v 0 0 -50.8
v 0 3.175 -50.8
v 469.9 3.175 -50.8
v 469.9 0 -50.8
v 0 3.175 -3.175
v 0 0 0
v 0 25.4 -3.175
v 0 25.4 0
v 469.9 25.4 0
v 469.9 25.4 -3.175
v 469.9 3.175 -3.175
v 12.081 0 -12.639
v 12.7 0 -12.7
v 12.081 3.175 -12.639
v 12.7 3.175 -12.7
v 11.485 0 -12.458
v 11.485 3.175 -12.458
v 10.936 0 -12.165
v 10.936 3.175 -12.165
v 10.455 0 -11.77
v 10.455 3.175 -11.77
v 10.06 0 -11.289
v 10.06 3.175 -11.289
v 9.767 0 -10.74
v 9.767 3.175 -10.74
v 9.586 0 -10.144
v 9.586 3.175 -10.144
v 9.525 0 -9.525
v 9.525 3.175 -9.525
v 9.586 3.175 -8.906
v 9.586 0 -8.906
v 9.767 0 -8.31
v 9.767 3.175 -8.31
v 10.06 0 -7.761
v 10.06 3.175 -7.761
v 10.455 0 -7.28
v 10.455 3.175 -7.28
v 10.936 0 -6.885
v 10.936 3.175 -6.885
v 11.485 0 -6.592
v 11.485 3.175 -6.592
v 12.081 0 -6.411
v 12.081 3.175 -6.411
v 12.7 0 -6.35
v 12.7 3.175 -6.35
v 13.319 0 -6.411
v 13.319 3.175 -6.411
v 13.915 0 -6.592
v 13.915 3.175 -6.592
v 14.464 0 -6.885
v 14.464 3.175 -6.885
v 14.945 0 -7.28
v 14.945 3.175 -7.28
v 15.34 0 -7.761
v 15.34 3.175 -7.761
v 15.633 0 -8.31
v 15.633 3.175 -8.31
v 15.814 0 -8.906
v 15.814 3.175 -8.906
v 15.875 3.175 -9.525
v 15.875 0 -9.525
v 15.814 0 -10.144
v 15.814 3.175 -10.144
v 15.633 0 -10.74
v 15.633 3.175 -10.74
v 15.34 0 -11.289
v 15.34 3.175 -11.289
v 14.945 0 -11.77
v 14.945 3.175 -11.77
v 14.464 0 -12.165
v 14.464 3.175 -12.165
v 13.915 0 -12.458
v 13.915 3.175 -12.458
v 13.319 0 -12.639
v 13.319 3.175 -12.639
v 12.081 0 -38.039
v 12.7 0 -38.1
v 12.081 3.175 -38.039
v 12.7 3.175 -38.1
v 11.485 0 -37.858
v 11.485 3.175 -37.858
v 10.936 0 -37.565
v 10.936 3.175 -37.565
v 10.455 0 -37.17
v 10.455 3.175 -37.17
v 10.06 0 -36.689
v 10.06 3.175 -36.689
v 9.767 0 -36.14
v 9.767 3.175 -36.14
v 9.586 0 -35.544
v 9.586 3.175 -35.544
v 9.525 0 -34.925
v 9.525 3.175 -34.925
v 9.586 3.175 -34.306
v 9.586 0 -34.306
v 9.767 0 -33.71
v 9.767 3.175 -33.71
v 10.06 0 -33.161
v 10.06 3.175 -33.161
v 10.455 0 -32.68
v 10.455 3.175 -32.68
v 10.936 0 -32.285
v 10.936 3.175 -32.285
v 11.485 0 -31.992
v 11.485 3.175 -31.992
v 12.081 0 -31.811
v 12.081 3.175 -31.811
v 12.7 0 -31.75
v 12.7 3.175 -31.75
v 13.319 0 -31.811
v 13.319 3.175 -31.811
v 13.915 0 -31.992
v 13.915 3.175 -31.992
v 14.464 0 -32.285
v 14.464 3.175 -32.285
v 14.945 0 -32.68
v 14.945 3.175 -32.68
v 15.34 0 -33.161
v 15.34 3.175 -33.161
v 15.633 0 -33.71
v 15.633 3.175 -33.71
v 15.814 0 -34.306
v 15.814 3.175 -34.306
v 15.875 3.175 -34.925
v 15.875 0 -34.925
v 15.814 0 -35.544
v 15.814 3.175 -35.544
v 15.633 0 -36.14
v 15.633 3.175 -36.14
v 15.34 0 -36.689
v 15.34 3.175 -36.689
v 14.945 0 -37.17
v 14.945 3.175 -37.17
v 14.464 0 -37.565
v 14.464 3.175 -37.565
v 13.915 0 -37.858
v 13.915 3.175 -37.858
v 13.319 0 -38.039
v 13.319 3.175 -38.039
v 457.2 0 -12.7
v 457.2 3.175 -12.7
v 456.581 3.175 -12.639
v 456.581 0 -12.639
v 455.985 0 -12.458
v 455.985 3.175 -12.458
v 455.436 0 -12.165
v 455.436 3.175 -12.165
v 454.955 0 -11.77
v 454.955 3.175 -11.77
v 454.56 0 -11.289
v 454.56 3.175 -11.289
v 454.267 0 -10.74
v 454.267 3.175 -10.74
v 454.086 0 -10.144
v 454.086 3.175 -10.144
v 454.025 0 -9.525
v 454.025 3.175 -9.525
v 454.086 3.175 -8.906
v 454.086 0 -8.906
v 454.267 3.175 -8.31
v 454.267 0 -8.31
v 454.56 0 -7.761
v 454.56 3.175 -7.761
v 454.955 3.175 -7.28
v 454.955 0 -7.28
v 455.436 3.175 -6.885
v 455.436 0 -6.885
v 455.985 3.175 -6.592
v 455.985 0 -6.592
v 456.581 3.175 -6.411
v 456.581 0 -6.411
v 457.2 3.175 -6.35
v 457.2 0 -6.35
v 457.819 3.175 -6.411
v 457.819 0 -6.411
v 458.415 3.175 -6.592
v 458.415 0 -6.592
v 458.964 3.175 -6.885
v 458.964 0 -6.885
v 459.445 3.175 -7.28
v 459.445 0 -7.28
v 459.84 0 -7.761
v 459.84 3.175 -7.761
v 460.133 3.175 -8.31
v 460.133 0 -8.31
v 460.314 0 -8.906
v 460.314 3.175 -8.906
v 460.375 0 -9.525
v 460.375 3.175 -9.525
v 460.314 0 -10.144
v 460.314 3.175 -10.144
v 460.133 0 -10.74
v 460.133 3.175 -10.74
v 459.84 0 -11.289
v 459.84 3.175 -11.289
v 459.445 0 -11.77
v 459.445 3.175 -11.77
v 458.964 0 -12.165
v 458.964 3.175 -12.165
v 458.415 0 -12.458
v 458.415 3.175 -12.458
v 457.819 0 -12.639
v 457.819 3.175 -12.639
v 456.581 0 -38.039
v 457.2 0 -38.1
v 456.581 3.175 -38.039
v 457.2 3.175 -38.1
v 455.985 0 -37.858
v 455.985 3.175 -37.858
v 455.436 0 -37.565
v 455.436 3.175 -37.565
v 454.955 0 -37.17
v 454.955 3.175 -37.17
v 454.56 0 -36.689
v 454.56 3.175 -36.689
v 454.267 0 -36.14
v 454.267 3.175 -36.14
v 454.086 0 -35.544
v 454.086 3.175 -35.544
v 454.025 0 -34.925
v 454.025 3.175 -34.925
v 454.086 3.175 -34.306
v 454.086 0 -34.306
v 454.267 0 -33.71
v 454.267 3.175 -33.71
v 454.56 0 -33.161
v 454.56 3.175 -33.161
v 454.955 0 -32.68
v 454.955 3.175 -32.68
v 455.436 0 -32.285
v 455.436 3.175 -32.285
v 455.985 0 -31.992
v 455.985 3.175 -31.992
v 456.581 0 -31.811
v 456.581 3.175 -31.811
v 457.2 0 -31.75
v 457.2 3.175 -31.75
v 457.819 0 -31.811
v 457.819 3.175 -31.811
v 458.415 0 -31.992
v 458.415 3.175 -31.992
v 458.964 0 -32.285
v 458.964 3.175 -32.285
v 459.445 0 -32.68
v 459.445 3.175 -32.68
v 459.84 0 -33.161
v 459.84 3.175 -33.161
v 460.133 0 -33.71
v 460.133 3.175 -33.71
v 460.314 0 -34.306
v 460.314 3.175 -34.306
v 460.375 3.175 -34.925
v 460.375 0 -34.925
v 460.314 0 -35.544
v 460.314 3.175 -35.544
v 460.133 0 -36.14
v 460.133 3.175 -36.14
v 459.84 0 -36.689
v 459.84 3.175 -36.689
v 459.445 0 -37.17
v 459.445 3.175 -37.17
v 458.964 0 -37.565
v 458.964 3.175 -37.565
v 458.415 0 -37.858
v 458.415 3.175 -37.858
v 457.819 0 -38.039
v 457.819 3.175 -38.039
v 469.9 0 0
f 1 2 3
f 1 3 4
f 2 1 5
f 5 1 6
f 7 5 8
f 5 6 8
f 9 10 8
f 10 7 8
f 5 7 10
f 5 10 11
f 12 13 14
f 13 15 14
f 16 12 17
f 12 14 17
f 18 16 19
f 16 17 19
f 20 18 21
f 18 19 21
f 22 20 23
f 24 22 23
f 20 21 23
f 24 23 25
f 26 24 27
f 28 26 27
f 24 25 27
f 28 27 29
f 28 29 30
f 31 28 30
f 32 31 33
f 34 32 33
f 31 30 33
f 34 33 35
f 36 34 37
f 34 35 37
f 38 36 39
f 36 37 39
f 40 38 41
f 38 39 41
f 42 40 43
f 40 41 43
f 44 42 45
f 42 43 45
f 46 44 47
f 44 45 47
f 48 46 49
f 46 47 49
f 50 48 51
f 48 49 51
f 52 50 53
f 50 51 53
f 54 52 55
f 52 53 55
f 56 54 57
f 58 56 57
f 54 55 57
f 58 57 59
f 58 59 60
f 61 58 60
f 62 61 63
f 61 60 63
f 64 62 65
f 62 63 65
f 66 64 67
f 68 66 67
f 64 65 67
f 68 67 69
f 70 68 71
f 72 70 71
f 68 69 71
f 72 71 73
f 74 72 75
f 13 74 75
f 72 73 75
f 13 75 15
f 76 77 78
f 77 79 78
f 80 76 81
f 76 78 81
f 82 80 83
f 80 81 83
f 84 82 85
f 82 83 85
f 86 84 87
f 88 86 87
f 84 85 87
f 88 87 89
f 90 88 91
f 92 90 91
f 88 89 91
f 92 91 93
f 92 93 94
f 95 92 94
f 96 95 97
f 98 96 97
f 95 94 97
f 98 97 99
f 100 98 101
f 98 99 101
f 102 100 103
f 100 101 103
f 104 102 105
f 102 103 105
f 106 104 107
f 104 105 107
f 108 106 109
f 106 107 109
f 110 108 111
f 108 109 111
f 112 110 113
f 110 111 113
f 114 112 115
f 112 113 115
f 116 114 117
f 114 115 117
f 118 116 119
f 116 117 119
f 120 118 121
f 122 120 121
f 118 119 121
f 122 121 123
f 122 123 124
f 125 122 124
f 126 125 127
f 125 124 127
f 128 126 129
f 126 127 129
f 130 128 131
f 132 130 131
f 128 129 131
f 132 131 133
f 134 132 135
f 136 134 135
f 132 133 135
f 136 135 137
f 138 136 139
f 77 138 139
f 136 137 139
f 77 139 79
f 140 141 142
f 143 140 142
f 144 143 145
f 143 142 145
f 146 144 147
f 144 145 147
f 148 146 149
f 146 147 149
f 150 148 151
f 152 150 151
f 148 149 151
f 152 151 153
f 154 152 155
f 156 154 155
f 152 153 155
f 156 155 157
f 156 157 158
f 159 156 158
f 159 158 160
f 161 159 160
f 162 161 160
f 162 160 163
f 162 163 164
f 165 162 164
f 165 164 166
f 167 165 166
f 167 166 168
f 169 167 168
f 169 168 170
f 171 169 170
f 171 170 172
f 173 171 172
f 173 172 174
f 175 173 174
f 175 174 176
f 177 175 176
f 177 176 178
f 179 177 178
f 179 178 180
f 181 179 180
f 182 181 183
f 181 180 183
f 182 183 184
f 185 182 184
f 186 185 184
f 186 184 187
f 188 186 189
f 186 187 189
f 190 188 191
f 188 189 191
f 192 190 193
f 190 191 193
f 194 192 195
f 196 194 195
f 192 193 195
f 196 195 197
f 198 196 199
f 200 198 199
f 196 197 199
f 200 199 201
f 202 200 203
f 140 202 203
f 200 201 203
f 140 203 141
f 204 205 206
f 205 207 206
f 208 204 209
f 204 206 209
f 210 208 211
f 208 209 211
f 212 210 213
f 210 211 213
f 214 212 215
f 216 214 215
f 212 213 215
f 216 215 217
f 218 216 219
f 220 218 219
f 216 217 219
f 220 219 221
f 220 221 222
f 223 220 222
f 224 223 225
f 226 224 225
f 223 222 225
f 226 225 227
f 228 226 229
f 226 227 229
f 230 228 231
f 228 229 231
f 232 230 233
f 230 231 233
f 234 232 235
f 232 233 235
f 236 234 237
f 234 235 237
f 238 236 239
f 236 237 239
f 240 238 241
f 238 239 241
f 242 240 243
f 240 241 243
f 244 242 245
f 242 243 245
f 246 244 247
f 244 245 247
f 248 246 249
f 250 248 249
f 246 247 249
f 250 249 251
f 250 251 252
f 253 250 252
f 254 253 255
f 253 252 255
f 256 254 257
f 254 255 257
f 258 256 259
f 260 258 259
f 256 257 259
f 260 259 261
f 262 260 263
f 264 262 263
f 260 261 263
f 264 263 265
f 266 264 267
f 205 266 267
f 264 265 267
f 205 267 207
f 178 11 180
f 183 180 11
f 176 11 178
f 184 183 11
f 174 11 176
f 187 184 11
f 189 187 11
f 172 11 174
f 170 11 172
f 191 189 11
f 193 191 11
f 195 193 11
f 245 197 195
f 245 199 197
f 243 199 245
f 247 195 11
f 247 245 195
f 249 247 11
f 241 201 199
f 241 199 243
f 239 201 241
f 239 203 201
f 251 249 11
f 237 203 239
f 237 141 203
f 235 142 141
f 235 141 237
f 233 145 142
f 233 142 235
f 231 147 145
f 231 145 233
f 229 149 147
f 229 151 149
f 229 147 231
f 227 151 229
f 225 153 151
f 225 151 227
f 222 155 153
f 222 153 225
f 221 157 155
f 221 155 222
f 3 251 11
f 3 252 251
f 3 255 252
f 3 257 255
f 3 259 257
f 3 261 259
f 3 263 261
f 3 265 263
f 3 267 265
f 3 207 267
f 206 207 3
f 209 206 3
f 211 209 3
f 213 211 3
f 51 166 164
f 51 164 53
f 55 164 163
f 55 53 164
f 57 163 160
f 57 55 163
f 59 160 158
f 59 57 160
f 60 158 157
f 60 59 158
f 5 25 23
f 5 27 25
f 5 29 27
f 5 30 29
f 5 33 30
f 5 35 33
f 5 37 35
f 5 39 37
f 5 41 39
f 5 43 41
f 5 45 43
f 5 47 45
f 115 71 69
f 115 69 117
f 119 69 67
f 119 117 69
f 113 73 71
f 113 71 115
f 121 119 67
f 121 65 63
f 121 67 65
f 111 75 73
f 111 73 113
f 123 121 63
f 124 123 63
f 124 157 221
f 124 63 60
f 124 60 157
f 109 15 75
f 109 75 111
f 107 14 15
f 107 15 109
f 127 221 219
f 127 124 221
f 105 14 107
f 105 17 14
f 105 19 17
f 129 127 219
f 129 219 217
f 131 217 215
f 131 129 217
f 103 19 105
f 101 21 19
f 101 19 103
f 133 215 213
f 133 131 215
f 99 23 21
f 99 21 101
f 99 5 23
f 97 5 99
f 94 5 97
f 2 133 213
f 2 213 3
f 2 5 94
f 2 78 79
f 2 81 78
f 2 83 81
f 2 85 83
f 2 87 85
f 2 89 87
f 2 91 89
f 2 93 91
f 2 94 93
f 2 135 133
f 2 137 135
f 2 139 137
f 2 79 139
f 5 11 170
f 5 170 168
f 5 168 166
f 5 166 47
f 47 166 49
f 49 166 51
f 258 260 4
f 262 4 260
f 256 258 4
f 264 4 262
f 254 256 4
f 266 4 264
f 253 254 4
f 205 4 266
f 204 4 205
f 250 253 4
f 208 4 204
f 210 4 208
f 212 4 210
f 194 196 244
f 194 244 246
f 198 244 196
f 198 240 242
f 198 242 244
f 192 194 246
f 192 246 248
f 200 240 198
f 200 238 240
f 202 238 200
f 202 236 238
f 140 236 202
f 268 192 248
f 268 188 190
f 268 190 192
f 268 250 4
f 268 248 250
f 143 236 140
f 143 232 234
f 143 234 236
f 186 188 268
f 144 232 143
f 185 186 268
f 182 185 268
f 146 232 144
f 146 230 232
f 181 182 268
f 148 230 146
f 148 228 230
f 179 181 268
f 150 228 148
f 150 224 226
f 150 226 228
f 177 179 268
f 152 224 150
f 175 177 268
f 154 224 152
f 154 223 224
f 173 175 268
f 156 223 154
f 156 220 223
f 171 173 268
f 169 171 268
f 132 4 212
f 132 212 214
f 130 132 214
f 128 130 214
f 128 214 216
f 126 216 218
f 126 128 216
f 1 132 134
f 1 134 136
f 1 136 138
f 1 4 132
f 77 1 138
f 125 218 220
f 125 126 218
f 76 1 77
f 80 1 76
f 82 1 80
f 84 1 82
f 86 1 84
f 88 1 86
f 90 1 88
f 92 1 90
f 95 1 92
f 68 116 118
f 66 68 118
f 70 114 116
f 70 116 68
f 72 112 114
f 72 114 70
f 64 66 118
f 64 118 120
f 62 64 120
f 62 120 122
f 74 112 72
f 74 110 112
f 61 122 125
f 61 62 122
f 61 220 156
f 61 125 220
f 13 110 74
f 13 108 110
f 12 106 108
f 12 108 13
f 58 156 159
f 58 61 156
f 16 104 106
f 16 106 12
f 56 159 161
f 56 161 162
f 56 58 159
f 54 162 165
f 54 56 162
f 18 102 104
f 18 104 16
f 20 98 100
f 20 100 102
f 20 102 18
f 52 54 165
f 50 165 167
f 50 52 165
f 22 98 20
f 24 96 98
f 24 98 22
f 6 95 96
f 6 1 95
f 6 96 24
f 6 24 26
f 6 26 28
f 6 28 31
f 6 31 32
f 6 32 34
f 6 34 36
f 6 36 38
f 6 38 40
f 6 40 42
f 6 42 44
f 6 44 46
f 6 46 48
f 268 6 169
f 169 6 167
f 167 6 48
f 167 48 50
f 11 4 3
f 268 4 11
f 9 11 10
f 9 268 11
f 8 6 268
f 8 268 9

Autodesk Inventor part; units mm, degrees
ref_plane "YZ Plane" through (0, 0, 0) normal (1, 0, 0) x (0, 1, 0)
ref_plane "XZ Plane" through (0, 0, 0) normal (0, 1, 0) x (-1, 0, 0)
ref_plane "XY Plane" through (0, 0, 0) normal (0, 0, 1) x (1, 0, 0)
sketch "Sketch1" plane through (0, 0, 0) normal (1, 0, 0) x (0, 1, 0)
  line L0 (0, 0) -> (3.175, 0)
  line L1 (3.175, 0) -> (3.175, -50.8)
  line L2 (3.175, -50.8) -> (0, -50.8)
  line L3 (0, -50.8) -> (0, 0)
  line L4 (0, 0) -> (50.8, 0)
  line L5 (50.8, 0) -> (50.8, -3.175)
  line L6 (50.8, -3.175) -> (0, -3.175)
  line L7 (0, -3.175) -> (0, 0)
  dimension "d0" = 3.175
  dimension "d1" = 50.8
  dimension "d2" = 50.8
  dimension "d3" = 3.175
extrude "Extrusion1" add sketch "Sketch1" along normal blind 469.9
sketch "Sketch2" plane through (0, 0, -50.8) normal (0, -1, 0) x (1, 0, 0)
  line L0 (469.9, 50.8) -> (469.9, 0) projected
  line L1 (0, 50.8) -> (469.9, 50.8) projected
  line L2 (0, 50.8) -> (0, 0) projected
  line L3 (0, 0) -> (469.9, 0) projected
  point P0 (12.7, 41.275)
  point P1 (12.7, 15.875)
  point P2 (457.2, 41.275)
  point P3 (457.2, 15.875)
  dimension "d6" = 12.7
  dimension "d7" = 9.525
  dimension "d8" = 15.875
  dimension "d9" = 12.7
  dimension "d10" = 12.7
  dimension "d11" = 9.525
  dimension "d12" = 12.7
  dimension "d13" = 15.875
hole "Hole1" at (12.7, 0, -9.525) at (12.7, 0, -34.925) at (457.2, 0, -9.525) at (457.2, 0, -34.925) direction (0, 1, 0) diameter 6.35 end through all
sketch "Sketch3" plane through (0, 0, 0) normal (-1, 0, 0) x (0, 0, 1)
  line L0 (0, 0) -> (-50.8, 0) projected
  line L1 (0, 50.8) -> (0, 0) projected
  line L2 (-3.175, 50.8) -> (0, 50.8) projected
  line L3 (-3.175, 3.175) -> (-3.175, 50.8) projected
  line L4 (-50.8, 3.175) -> (-3.175, 3.175) projected
  line L5 (-50.8, 0) -> (-50.8, 3.175) projected
  line L6 (0, 50.8) -> (-3.175, 50.8)
  line L7 (-3.175, 50.8) -> (-3.175, 25.4)
  line L8 (-3.175, 25.4) -> (0, 25.4)
  line L9 (0, 25.4) -> (0, 50.8)
  dimension "d21" = 3.175
  dimension "d22" = 25.4
extrude "Extrusion2" cut sketch "Sketch3" against normal blind 660.4 contours L8 L3 L2 L1
properties part number "2x2 angle horizontal"
